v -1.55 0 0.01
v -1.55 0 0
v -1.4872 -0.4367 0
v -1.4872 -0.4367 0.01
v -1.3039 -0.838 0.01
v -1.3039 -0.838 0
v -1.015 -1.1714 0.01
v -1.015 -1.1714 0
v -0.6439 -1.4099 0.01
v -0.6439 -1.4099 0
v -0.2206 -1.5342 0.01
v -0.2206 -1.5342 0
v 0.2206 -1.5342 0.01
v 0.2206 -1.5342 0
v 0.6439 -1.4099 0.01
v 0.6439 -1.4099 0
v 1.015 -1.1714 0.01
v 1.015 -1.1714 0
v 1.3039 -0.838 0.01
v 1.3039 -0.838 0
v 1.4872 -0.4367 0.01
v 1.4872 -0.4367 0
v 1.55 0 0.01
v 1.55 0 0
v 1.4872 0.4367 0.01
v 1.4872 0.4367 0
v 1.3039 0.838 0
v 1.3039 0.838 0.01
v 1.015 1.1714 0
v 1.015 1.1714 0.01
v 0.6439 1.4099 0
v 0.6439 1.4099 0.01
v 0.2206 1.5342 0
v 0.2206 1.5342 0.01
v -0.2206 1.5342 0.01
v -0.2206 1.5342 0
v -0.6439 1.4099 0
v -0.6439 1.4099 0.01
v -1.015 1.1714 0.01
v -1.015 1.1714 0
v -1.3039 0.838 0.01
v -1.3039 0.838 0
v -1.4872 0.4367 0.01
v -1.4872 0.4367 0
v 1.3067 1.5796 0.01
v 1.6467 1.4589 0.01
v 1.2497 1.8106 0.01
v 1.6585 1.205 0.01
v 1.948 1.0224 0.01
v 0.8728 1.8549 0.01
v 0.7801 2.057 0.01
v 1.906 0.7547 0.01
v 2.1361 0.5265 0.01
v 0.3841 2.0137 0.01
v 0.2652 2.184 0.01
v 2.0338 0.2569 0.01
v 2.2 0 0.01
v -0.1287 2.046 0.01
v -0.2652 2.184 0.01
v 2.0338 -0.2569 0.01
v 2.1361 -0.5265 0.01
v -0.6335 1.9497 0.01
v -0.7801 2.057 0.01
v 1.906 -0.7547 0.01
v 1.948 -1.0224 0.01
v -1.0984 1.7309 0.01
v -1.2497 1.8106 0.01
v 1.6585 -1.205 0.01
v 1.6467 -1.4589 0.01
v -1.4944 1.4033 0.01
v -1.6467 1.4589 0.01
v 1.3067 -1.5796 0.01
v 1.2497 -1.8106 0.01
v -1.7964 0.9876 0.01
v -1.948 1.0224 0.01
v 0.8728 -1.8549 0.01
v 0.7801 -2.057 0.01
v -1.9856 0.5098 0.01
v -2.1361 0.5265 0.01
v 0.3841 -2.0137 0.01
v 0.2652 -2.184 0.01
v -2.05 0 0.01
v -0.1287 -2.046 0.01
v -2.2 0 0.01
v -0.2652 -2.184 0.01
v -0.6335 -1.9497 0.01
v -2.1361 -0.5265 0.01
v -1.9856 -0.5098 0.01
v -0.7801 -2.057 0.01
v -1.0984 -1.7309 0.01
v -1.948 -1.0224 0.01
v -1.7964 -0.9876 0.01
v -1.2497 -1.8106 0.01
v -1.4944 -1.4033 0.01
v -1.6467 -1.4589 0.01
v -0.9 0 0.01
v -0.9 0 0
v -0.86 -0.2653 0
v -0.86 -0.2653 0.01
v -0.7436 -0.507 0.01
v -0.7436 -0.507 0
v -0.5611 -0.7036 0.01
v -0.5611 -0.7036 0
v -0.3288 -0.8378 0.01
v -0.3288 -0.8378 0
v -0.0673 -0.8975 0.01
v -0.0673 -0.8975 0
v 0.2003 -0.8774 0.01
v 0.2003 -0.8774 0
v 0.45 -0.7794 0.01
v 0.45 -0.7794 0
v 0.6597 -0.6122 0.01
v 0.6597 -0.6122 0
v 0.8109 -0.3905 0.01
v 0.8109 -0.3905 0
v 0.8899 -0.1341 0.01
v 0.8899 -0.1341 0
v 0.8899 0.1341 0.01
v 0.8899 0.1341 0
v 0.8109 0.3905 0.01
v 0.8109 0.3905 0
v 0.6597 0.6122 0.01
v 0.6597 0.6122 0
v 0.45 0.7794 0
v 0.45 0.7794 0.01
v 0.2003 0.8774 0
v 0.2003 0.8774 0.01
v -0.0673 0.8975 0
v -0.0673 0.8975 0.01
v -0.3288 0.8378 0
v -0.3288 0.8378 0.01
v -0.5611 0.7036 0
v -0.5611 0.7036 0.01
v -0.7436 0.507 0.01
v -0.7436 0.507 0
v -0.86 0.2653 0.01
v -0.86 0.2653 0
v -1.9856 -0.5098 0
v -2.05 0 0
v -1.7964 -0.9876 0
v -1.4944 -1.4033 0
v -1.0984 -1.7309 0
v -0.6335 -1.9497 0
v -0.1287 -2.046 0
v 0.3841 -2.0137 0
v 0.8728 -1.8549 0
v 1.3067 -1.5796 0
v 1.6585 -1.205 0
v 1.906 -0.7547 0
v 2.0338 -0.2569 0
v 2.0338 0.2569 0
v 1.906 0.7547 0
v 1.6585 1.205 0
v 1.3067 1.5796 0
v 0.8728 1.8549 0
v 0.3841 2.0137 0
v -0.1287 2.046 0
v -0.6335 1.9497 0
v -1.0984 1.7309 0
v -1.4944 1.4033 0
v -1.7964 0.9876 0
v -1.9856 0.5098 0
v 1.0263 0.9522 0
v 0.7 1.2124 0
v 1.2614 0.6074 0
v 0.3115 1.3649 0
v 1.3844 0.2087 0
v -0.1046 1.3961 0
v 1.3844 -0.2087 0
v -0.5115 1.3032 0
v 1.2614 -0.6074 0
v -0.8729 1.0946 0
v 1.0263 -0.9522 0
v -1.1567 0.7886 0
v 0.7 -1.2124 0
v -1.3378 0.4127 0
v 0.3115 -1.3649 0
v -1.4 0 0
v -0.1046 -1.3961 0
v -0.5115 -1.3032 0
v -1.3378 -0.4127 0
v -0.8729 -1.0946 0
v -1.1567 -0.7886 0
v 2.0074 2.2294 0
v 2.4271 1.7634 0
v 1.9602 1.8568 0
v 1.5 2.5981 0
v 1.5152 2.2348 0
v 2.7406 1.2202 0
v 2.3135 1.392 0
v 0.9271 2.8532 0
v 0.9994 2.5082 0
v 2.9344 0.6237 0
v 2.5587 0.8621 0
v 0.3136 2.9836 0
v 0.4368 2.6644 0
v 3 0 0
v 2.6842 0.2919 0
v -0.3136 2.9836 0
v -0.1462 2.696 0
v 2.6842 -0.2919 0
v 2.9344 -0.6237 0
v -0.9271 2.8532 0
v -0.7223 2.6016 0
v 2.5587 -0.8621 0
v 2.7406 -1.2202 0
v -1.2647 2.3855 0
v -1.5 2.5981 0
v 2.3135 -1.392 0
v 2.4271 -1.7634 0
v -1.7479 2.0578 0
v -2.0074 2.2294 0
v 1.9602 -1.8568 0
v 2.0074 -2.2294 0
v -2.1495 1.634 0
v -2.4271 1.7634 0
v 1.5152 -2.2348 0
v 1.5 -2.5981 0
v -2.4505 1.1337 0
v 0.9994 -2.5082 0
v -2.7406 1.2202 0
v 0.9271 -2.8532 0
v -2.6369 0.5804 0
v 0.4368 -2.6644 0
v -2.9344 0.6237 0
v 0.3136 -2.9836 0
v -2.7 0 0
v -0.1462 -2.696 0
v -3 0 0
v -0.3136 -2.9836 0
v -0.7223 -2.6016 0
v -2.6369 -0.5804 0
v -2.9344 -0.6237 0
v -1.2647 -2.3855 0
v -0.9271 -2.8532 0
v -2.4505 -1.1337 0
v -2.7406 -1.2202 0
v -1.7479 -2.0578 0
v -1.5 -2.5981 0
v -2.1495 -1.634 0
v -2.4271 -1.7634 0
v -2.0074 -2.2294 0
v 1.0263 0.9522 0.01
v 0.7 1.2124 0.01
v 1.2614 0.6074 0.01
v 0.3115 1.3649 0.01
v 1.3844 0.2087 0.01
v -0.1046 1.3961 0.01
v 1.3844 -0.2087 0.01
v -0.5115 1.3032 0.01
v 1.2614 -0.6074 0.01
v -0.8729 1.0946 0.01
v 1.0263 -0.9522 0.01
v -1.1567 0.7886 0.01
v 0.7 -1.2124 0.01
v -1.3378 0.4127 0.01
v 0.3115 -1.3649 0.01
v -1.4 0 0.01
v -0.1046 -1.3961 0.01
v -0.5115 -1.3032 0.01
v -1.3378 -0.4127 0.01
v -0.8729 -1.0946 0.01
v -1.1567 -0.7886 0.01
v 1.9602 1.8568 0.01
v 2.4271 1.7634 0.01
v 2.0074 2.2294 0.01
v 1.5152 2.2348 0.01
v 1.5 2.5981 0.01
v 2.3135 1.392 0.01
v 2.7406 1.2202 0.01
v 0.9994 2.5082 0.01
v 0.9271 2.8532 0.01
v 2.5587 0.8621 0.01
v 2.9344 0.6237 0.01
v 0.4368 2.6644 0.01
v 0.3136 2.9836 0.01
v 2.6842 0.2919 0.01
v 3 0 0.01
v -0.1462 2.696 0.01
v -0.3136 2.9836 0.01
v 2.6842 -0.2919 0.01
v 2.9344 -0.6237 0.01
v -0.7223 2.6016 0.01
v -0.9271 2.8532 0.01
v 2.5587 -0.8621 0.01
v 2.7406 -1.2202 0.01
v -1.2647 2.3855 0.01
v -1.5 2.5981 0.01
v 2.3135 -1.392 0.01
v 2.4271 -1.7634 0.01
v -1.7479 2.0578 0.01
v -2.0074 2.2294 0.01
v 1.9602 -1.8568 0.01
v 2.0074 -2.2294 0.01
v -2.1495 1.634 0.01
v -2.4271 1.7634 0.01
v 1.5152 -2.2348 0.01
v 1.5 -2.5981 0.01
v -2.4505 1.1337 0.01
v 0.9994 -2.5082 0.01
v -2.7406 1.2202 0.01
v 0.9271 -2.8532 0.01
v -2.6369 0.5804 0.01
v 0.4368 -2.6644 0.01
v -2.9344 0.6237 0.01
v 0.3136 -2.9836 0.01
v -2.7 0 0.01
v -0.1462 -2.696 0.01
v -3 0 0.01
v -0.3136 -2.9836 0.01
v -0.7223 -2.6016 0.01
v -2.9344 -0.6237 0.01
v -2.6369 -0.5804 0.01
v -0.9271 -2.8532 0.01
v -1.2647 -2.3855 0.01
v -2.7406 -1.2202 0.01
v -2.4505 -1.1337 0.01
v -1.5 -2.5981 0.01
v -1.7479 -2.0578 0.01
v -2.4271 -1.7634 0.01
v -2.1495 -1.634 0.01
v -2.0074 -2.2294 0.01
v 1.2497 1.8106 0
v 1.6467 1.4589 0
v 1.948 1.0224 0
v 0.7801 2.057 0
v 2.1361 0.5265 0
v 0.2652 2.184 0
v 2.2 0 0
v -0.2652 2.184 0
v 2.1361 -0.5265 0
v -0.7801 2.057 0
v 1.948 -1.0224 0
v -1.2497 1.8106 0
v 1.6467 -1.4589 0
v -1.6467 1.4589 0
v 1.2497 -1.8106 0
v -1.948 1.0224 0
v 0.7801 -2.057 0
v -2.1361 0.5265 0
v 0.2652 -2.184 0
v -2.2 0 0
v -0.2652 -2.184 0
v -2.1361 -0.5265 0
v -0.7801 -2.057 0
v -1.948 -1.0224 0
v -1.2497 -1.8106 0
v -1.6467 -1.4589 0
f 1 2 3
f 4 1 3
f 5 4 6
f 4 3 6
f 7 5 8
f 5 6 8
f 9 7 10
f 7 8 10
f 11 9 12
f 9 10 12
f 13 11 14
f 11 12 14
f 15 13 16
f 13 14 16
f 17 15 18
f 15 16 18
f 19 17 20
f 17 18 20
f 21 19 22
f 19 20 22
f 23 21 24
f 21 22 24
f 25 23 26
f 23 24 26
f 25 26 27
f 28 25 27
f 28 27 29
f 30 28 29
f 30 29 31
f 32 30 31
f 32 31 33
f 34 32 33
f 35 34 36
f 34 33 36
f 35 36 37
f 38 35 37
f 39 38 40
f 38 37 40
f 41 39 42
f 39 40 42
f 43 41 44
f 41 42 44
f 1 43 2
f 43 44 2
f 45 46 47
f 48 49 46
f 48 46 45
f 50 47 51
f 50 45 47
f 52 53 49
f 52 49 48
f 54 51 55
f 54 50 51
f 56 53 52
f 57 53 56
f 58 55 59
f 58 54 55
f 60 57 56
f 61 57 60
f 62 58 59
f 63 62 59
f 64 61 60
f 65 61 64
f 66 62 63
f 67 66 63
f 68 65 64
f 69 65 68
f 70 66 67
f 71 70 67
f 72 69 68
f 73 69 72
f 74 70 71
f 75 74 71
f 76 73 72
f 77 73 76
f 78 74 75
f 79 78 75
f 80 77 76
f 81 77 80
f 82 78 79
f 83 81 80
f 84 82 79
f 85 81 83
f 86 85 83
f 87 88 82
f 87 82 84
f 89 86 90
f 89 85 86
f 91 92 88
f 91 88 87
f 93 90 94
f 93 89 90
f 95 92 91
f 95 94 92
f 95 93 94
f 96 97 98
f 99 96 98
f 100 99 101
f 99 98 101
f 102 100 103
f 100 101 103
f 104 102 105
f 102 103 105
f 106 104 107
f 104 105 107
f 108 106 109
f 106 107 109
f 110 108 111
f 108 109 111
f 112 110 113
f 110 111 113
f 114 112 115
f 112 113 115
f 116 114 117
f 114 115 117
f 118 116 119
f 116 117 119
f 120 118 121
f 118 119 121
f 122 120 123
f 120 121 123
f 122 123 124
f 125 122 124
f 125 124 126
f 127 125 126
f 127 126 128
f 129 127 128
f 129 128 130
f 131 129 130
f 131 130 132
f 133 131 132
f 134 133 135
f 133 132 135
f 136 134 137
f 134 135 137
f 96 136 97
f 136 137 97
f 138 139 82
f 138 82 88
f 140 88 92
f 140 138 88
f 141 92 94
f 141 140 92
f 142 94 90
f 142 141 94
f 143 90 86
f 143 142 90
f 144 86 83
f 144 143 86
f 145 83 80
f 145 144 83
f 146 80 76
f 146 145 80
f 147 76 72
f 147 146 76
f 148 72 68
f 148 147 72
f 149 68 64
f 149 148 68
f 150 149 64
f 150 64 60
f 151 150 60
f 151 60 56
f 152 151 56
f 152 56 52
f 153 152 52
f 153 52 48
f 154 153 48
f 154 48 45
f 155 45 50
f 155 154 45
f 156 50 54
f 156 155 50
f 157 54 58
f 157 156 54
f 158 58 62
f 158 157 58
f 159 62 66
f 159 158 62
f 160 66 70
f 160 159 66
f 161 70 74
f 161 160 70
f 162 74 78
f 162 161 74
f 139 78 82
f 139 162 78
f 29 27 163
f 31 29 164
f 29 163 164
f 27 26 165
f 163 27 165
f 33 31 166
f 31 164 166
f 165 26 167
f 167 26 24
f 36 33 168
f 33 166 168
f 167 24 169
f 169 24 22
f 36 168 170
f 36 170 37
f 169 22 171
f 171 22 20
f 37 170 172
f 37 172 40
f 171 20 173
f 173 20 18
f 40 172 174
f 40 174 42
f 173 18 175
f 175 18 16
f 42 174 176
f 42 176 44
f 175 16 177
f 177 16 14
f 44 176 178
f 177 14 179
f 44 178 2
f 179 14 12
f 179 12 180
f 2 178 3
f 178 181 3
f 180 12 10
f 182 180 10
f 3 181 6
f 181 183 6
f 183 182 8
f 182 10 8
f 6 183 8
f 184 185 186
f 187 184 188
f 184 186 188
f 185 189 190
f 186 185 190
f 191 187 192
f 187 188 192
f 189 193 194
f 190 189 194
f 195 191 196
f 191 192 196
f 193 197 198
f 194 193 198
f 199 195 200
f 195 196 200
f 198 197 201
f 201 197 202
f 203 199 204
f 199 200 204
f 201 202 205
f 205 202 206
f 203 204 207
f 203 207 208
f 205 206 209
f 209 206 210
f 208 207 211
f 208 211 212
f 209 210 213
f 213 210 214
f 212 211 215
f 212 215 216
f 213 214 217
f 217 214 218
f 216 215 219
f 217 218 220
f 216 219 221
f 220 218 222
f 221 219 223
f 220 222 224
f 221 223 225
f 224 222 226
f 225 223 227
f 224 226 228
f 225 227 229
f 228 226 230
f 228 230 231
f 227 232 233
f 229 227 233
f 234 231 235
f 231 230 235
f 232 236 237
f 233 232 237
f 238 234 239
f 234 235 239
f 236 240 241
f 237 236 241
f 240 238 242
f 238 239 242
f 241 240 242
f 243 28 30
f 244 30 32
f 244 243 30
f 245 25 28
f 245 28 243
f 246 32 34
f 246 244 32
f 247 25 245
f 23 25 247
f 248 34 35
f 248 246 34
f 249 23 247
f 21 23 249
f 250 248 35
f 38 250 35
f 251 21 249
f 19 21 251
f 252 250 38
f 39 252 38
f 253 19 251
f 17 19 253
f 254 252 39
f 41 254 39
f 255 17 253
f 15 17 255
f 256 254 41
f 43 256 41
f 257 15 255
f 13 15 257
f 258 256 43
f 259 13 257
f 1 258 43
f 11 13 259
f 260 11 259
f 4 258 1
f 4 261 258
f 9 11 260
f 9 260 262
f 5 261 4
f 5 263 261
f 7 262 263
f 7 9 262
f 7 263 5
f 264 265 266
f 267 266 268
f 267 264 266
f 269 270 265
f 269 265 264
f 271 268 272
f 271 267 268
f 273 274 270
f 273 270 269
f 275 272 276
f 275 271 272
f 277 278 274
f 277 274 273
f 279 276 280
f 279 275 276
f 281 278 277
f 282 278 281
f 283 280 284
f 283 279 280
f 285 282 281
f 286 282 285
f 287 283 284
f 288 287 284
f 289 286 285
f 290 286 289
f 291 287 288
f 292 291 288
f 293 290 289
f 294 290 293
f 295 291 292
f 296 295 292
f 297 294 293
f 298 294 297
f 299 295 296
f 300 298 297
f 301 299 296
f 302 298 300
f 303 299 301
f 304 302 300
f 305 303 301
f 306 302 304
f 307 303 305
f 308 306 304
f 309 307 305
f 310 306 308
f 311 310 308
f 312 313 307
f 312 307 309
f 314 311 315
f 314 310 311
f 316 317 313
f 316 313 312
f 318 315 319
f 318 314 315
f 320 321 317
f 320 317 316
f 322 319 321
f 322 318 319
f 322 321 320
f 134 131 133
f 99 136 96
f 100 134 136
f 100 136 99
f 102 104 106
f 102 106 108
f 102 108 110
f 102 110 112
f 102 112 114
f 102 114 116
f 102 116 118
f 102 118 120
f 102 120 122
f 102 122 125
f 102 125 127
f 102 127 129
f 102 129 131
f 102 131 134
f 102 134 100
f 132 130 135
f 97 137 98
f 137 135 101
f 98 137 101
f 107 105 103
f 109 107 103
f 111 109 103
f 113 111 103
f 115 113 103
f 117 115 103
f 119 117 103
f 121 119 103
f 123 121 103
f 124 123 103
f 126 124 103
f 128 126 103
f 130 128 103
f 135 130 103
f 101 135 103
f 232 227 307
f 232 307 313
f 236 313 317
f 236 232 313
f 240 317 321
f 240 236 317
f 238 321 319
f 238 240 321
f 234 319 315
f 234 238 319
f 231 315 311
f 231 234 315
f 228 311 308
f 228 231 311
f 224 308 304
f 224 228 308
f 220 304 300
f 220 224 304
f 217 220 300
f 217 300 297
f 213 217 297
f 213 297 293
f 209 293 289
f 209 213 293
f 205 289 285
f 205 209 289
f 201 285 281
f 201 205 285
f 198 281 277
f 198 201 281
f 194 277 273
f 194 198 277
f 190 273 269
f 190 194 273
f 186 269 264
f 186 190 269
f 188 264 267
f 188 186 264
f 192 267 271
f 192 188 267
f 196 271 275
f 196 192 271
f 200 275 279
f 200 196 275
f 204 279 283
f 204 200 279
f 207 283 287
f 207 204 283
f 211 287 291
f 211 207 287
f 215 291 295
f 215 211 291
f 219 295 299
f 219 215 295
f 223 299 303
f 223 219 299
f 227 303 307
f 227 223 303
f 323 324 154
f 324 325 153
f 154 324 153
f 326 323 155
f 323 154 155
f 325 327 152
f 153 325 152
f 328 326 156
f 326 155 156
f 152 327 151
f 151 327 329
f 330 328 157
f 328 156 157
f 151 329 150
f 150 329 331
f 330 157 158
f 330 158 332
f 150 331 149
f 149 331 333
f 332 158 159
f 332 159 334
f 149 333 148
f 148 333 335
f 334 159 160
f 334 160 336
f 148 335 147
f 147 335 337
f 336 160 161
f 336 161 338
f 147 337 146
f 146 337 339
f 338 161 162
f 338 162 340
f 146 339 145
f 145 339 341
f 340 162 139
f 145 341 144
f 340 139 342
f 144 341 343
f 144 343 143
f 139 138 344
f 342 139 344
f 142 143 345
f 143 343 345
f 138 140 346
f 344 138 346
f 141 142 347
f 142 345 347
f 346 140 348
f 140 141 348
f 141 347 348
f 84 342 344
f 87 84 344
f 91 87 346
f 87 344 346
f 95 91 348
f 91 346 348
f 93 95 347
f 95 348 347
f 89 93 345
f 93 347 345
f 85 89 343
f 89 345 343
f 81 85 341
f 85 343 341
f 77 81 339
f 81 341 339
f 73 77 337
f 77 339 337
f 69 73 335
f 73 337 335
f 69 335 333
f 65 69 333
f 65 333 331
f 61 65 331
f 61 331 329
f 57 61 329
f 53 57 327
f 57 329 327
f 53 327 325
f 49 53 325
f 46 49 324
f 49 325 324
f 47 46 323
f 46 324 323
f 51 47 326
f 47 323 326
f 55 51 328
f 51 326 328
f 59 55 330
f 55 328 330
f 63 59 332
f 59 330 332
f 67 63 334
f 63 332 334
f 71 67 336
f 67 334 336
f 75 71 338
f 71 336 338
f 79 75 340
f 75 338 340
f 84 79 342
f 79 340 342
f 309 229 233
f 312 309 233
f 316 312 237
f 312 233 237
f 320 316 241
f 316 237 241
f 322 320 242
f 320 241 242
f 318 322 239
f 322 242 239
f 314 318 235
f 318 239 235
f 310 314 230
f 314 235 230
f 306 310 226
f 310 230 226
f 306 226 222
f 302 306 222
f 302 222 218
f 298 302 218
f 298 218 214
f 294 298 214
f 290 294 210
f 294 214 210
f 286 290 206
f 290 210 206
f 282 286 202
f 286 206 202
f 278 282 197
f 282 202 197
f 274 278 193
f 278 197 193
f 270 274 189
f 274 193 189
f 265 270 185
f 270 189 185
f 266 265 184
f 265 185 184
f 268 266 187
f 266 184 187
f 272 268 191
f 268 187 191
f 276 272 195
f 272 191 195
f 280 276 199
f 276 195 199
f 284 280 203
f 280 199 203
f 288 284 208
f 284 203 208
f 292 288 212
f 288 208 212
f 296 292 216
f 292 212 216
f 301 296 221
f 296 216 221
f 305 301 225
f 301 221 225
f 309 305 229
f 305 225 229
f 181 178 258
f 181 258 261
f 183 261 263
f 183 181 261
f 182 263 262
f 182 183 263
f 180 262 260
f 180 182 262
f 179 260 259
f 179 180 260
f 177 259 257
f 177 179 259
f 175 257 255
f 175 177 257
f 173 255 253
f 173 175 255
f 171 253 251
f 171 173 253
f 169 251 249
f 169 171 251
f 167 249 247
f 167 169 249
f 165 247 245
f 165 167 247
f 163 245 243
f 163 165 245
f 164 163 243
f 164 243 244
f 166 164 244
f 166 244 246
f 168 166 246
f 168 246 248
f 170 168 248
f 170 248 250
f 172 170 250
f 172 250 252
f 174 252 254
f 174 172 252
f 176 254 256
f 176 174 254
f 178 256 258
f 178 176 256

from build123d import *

# Parameters (mm, degrees)
SKETCH_1_R        = 3
SKETCH_1_R_2      = 2.7
EXTRUDE_1_DEPTH   = 0.01
SKETCH_1_R_3      = 2.2
SKETCH_1_R_4      = 2.05
EXTRUDE_1_2_DEPTH = 0.01
SKETCH_1_R_5      = 1.55
SKETCH_1_R_6      = 1.4
EXTRUDE_1_3_DEPTH = 0.01
SKETCH_1_R_7      = 0.9
EXTRUDE_1_4_DEPTH = 0.01


with BuildPart() as part:
    # Эскиз1 → Бобышка-Вытянуть1 (new body)
    with BuildSketch(Plane.XY):
        with Locations(Location((0, 0, 0), (0, 0, 180))):
            Circle(SKETCH_1_R)
        with Locations(Location((0, 0, 0), (0, 0, 180))):
            Circle(SKETCH_1_R_2, mode=Mode.SUBTRACT)
    extrude(amount=EXTRUDE_1_DEPTH)


with BuildPart() as body_2:
    # Эскиз1 → Extrude 1 2 (new body)
    with BuildSketch(Plane.XY):
        with Locations(Location((0, 0, 0), (0, 0, 180))):
            Circle(SKETCH_1_R_3)
        with Locations(Location((0, 0, 0), (0, 0, 180))):
            Circle(SKETCH_1_R_4, mode=Mode.SUBTRACT)
    extrude(amount=EXTRUDE_1_2_DEPTH)


with BuildPart() as body_3:
    # Эскиз1 → Extrude 1 3 (new body)
    with BuildSketch(Plane.XY):
        with Locations(Location((0, 0, 0), (0, 0, 180))):
            Circle(SKETCH_1_R_5)
        with Locations(Location((0, 0, 0), (0, 0, 180))):
            Circle(SKETCH_1_R_6, mode=Mode.SUBTRACT)
    extrude(amount=EXTRUDE_1_3_DEPTH)


with BuildPart() as body_4:
    # Эскиз1 → Extrude 1 4 (new body)
    with BuildSketch(Plane.XY):
        with Locations(Location((0, 0, 0), (0, 0, 180))):
            Circle(SKETCH_1_R_7)
    extrude(amount=EXTRUDE_1_4_DEPTH)


solid = Compound([part.part, body_2.part, body_3.part, body_4.part])
